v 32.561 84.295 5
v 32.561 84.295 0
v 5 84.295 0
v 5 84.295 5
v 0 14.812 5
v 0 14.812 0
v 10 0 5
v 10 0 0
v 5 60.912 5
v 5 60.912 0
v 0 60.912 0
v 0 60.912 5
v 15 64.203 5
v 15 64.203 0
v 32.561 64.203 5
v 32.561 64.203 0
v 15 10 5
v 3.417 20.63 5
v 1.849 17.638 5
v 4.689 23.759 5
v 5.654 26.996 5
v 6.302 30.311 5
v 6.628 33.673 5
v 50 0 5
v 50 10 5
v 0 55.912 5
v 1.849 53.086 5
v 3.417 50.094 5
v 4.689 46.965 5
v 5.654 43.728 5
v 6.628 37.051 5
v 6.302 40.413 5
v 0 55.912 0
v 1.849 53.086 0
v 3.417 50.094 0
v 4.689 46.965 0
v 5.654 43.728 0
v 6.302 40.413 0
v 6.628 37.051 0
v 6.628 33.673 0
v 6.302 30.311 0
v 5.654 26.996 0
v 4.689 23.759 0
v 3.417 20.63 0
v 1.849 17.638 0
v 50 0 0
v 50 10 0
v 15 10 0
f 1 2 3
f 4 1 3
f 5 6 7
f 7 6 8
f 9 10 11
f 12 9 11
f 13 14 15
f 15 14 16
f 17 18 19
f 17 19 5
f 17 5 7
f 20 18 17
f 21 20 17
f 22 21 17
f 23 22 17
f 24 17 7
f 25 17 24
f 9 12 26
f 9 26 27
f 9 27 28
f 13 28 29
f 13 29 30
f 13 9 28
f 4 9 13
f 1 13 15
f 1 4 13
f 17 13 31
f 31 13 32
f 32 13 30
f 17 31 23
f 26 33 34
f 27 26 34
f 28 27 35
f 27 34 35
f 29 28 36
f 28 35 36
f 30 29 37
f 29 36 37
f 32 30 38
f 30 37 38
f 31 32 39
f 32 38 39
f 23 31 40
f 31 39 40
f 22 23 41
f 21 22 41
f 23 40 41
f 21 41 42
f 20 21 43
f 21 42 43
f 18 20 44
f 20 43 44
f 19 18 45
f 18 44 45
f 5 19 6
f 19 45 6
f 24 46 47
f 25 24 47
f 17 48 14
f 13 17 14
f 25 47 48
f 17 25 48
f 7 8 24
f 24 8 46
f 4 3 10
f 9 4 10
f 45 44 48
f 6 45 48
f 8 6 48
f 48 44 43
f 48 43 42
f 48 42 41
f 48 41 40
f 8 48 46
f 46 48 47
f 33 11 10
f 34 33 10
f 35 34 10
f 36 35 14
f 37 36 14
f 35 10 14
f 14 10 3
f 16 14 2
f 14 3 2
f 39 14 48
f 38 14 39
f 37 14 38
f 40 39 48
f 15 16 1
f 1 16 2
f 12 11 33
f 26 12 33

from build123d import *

# Parameters (mm, degrees)
BOSS_EXTRU_1_DEPTH = 5


with BuildPart() as part:
    # Esquisse1 → Boss.-Extru.1 (new body)
    with BuildSketch(Plane.XY):
        with BuildLine():
            Line((50, 0), (50, 10))
            Line((50, 10), (15, 10))
            Line((15, 10), (15, 64.203101523))
            Line((15, 64.203101523), (32.561057994, 64.203101523))
            Line((32.561057994, 64.203101523), (32.561057994, 84.294650344))
            Line((32.561057994, 84.294650344), (5, 84.294650344))
            Line((5, 84.294650344), (5, 60.912399745))
            Line((5, 60.912399745), (0, 60.912399745))
            Line((0, 60.912399745), (0, 55.912399745))
            ThreePointArc((0, 55.912399745), (6.66837561, 35.361996844), (0, 14.811593943))
            Line((0, 14.811593943), (10, 0))
            Line((10, 0), (50, 0))
        make_face()
    extrude(amount=BOSS_EXTRU_1_DEPTH)


solid = part.part
